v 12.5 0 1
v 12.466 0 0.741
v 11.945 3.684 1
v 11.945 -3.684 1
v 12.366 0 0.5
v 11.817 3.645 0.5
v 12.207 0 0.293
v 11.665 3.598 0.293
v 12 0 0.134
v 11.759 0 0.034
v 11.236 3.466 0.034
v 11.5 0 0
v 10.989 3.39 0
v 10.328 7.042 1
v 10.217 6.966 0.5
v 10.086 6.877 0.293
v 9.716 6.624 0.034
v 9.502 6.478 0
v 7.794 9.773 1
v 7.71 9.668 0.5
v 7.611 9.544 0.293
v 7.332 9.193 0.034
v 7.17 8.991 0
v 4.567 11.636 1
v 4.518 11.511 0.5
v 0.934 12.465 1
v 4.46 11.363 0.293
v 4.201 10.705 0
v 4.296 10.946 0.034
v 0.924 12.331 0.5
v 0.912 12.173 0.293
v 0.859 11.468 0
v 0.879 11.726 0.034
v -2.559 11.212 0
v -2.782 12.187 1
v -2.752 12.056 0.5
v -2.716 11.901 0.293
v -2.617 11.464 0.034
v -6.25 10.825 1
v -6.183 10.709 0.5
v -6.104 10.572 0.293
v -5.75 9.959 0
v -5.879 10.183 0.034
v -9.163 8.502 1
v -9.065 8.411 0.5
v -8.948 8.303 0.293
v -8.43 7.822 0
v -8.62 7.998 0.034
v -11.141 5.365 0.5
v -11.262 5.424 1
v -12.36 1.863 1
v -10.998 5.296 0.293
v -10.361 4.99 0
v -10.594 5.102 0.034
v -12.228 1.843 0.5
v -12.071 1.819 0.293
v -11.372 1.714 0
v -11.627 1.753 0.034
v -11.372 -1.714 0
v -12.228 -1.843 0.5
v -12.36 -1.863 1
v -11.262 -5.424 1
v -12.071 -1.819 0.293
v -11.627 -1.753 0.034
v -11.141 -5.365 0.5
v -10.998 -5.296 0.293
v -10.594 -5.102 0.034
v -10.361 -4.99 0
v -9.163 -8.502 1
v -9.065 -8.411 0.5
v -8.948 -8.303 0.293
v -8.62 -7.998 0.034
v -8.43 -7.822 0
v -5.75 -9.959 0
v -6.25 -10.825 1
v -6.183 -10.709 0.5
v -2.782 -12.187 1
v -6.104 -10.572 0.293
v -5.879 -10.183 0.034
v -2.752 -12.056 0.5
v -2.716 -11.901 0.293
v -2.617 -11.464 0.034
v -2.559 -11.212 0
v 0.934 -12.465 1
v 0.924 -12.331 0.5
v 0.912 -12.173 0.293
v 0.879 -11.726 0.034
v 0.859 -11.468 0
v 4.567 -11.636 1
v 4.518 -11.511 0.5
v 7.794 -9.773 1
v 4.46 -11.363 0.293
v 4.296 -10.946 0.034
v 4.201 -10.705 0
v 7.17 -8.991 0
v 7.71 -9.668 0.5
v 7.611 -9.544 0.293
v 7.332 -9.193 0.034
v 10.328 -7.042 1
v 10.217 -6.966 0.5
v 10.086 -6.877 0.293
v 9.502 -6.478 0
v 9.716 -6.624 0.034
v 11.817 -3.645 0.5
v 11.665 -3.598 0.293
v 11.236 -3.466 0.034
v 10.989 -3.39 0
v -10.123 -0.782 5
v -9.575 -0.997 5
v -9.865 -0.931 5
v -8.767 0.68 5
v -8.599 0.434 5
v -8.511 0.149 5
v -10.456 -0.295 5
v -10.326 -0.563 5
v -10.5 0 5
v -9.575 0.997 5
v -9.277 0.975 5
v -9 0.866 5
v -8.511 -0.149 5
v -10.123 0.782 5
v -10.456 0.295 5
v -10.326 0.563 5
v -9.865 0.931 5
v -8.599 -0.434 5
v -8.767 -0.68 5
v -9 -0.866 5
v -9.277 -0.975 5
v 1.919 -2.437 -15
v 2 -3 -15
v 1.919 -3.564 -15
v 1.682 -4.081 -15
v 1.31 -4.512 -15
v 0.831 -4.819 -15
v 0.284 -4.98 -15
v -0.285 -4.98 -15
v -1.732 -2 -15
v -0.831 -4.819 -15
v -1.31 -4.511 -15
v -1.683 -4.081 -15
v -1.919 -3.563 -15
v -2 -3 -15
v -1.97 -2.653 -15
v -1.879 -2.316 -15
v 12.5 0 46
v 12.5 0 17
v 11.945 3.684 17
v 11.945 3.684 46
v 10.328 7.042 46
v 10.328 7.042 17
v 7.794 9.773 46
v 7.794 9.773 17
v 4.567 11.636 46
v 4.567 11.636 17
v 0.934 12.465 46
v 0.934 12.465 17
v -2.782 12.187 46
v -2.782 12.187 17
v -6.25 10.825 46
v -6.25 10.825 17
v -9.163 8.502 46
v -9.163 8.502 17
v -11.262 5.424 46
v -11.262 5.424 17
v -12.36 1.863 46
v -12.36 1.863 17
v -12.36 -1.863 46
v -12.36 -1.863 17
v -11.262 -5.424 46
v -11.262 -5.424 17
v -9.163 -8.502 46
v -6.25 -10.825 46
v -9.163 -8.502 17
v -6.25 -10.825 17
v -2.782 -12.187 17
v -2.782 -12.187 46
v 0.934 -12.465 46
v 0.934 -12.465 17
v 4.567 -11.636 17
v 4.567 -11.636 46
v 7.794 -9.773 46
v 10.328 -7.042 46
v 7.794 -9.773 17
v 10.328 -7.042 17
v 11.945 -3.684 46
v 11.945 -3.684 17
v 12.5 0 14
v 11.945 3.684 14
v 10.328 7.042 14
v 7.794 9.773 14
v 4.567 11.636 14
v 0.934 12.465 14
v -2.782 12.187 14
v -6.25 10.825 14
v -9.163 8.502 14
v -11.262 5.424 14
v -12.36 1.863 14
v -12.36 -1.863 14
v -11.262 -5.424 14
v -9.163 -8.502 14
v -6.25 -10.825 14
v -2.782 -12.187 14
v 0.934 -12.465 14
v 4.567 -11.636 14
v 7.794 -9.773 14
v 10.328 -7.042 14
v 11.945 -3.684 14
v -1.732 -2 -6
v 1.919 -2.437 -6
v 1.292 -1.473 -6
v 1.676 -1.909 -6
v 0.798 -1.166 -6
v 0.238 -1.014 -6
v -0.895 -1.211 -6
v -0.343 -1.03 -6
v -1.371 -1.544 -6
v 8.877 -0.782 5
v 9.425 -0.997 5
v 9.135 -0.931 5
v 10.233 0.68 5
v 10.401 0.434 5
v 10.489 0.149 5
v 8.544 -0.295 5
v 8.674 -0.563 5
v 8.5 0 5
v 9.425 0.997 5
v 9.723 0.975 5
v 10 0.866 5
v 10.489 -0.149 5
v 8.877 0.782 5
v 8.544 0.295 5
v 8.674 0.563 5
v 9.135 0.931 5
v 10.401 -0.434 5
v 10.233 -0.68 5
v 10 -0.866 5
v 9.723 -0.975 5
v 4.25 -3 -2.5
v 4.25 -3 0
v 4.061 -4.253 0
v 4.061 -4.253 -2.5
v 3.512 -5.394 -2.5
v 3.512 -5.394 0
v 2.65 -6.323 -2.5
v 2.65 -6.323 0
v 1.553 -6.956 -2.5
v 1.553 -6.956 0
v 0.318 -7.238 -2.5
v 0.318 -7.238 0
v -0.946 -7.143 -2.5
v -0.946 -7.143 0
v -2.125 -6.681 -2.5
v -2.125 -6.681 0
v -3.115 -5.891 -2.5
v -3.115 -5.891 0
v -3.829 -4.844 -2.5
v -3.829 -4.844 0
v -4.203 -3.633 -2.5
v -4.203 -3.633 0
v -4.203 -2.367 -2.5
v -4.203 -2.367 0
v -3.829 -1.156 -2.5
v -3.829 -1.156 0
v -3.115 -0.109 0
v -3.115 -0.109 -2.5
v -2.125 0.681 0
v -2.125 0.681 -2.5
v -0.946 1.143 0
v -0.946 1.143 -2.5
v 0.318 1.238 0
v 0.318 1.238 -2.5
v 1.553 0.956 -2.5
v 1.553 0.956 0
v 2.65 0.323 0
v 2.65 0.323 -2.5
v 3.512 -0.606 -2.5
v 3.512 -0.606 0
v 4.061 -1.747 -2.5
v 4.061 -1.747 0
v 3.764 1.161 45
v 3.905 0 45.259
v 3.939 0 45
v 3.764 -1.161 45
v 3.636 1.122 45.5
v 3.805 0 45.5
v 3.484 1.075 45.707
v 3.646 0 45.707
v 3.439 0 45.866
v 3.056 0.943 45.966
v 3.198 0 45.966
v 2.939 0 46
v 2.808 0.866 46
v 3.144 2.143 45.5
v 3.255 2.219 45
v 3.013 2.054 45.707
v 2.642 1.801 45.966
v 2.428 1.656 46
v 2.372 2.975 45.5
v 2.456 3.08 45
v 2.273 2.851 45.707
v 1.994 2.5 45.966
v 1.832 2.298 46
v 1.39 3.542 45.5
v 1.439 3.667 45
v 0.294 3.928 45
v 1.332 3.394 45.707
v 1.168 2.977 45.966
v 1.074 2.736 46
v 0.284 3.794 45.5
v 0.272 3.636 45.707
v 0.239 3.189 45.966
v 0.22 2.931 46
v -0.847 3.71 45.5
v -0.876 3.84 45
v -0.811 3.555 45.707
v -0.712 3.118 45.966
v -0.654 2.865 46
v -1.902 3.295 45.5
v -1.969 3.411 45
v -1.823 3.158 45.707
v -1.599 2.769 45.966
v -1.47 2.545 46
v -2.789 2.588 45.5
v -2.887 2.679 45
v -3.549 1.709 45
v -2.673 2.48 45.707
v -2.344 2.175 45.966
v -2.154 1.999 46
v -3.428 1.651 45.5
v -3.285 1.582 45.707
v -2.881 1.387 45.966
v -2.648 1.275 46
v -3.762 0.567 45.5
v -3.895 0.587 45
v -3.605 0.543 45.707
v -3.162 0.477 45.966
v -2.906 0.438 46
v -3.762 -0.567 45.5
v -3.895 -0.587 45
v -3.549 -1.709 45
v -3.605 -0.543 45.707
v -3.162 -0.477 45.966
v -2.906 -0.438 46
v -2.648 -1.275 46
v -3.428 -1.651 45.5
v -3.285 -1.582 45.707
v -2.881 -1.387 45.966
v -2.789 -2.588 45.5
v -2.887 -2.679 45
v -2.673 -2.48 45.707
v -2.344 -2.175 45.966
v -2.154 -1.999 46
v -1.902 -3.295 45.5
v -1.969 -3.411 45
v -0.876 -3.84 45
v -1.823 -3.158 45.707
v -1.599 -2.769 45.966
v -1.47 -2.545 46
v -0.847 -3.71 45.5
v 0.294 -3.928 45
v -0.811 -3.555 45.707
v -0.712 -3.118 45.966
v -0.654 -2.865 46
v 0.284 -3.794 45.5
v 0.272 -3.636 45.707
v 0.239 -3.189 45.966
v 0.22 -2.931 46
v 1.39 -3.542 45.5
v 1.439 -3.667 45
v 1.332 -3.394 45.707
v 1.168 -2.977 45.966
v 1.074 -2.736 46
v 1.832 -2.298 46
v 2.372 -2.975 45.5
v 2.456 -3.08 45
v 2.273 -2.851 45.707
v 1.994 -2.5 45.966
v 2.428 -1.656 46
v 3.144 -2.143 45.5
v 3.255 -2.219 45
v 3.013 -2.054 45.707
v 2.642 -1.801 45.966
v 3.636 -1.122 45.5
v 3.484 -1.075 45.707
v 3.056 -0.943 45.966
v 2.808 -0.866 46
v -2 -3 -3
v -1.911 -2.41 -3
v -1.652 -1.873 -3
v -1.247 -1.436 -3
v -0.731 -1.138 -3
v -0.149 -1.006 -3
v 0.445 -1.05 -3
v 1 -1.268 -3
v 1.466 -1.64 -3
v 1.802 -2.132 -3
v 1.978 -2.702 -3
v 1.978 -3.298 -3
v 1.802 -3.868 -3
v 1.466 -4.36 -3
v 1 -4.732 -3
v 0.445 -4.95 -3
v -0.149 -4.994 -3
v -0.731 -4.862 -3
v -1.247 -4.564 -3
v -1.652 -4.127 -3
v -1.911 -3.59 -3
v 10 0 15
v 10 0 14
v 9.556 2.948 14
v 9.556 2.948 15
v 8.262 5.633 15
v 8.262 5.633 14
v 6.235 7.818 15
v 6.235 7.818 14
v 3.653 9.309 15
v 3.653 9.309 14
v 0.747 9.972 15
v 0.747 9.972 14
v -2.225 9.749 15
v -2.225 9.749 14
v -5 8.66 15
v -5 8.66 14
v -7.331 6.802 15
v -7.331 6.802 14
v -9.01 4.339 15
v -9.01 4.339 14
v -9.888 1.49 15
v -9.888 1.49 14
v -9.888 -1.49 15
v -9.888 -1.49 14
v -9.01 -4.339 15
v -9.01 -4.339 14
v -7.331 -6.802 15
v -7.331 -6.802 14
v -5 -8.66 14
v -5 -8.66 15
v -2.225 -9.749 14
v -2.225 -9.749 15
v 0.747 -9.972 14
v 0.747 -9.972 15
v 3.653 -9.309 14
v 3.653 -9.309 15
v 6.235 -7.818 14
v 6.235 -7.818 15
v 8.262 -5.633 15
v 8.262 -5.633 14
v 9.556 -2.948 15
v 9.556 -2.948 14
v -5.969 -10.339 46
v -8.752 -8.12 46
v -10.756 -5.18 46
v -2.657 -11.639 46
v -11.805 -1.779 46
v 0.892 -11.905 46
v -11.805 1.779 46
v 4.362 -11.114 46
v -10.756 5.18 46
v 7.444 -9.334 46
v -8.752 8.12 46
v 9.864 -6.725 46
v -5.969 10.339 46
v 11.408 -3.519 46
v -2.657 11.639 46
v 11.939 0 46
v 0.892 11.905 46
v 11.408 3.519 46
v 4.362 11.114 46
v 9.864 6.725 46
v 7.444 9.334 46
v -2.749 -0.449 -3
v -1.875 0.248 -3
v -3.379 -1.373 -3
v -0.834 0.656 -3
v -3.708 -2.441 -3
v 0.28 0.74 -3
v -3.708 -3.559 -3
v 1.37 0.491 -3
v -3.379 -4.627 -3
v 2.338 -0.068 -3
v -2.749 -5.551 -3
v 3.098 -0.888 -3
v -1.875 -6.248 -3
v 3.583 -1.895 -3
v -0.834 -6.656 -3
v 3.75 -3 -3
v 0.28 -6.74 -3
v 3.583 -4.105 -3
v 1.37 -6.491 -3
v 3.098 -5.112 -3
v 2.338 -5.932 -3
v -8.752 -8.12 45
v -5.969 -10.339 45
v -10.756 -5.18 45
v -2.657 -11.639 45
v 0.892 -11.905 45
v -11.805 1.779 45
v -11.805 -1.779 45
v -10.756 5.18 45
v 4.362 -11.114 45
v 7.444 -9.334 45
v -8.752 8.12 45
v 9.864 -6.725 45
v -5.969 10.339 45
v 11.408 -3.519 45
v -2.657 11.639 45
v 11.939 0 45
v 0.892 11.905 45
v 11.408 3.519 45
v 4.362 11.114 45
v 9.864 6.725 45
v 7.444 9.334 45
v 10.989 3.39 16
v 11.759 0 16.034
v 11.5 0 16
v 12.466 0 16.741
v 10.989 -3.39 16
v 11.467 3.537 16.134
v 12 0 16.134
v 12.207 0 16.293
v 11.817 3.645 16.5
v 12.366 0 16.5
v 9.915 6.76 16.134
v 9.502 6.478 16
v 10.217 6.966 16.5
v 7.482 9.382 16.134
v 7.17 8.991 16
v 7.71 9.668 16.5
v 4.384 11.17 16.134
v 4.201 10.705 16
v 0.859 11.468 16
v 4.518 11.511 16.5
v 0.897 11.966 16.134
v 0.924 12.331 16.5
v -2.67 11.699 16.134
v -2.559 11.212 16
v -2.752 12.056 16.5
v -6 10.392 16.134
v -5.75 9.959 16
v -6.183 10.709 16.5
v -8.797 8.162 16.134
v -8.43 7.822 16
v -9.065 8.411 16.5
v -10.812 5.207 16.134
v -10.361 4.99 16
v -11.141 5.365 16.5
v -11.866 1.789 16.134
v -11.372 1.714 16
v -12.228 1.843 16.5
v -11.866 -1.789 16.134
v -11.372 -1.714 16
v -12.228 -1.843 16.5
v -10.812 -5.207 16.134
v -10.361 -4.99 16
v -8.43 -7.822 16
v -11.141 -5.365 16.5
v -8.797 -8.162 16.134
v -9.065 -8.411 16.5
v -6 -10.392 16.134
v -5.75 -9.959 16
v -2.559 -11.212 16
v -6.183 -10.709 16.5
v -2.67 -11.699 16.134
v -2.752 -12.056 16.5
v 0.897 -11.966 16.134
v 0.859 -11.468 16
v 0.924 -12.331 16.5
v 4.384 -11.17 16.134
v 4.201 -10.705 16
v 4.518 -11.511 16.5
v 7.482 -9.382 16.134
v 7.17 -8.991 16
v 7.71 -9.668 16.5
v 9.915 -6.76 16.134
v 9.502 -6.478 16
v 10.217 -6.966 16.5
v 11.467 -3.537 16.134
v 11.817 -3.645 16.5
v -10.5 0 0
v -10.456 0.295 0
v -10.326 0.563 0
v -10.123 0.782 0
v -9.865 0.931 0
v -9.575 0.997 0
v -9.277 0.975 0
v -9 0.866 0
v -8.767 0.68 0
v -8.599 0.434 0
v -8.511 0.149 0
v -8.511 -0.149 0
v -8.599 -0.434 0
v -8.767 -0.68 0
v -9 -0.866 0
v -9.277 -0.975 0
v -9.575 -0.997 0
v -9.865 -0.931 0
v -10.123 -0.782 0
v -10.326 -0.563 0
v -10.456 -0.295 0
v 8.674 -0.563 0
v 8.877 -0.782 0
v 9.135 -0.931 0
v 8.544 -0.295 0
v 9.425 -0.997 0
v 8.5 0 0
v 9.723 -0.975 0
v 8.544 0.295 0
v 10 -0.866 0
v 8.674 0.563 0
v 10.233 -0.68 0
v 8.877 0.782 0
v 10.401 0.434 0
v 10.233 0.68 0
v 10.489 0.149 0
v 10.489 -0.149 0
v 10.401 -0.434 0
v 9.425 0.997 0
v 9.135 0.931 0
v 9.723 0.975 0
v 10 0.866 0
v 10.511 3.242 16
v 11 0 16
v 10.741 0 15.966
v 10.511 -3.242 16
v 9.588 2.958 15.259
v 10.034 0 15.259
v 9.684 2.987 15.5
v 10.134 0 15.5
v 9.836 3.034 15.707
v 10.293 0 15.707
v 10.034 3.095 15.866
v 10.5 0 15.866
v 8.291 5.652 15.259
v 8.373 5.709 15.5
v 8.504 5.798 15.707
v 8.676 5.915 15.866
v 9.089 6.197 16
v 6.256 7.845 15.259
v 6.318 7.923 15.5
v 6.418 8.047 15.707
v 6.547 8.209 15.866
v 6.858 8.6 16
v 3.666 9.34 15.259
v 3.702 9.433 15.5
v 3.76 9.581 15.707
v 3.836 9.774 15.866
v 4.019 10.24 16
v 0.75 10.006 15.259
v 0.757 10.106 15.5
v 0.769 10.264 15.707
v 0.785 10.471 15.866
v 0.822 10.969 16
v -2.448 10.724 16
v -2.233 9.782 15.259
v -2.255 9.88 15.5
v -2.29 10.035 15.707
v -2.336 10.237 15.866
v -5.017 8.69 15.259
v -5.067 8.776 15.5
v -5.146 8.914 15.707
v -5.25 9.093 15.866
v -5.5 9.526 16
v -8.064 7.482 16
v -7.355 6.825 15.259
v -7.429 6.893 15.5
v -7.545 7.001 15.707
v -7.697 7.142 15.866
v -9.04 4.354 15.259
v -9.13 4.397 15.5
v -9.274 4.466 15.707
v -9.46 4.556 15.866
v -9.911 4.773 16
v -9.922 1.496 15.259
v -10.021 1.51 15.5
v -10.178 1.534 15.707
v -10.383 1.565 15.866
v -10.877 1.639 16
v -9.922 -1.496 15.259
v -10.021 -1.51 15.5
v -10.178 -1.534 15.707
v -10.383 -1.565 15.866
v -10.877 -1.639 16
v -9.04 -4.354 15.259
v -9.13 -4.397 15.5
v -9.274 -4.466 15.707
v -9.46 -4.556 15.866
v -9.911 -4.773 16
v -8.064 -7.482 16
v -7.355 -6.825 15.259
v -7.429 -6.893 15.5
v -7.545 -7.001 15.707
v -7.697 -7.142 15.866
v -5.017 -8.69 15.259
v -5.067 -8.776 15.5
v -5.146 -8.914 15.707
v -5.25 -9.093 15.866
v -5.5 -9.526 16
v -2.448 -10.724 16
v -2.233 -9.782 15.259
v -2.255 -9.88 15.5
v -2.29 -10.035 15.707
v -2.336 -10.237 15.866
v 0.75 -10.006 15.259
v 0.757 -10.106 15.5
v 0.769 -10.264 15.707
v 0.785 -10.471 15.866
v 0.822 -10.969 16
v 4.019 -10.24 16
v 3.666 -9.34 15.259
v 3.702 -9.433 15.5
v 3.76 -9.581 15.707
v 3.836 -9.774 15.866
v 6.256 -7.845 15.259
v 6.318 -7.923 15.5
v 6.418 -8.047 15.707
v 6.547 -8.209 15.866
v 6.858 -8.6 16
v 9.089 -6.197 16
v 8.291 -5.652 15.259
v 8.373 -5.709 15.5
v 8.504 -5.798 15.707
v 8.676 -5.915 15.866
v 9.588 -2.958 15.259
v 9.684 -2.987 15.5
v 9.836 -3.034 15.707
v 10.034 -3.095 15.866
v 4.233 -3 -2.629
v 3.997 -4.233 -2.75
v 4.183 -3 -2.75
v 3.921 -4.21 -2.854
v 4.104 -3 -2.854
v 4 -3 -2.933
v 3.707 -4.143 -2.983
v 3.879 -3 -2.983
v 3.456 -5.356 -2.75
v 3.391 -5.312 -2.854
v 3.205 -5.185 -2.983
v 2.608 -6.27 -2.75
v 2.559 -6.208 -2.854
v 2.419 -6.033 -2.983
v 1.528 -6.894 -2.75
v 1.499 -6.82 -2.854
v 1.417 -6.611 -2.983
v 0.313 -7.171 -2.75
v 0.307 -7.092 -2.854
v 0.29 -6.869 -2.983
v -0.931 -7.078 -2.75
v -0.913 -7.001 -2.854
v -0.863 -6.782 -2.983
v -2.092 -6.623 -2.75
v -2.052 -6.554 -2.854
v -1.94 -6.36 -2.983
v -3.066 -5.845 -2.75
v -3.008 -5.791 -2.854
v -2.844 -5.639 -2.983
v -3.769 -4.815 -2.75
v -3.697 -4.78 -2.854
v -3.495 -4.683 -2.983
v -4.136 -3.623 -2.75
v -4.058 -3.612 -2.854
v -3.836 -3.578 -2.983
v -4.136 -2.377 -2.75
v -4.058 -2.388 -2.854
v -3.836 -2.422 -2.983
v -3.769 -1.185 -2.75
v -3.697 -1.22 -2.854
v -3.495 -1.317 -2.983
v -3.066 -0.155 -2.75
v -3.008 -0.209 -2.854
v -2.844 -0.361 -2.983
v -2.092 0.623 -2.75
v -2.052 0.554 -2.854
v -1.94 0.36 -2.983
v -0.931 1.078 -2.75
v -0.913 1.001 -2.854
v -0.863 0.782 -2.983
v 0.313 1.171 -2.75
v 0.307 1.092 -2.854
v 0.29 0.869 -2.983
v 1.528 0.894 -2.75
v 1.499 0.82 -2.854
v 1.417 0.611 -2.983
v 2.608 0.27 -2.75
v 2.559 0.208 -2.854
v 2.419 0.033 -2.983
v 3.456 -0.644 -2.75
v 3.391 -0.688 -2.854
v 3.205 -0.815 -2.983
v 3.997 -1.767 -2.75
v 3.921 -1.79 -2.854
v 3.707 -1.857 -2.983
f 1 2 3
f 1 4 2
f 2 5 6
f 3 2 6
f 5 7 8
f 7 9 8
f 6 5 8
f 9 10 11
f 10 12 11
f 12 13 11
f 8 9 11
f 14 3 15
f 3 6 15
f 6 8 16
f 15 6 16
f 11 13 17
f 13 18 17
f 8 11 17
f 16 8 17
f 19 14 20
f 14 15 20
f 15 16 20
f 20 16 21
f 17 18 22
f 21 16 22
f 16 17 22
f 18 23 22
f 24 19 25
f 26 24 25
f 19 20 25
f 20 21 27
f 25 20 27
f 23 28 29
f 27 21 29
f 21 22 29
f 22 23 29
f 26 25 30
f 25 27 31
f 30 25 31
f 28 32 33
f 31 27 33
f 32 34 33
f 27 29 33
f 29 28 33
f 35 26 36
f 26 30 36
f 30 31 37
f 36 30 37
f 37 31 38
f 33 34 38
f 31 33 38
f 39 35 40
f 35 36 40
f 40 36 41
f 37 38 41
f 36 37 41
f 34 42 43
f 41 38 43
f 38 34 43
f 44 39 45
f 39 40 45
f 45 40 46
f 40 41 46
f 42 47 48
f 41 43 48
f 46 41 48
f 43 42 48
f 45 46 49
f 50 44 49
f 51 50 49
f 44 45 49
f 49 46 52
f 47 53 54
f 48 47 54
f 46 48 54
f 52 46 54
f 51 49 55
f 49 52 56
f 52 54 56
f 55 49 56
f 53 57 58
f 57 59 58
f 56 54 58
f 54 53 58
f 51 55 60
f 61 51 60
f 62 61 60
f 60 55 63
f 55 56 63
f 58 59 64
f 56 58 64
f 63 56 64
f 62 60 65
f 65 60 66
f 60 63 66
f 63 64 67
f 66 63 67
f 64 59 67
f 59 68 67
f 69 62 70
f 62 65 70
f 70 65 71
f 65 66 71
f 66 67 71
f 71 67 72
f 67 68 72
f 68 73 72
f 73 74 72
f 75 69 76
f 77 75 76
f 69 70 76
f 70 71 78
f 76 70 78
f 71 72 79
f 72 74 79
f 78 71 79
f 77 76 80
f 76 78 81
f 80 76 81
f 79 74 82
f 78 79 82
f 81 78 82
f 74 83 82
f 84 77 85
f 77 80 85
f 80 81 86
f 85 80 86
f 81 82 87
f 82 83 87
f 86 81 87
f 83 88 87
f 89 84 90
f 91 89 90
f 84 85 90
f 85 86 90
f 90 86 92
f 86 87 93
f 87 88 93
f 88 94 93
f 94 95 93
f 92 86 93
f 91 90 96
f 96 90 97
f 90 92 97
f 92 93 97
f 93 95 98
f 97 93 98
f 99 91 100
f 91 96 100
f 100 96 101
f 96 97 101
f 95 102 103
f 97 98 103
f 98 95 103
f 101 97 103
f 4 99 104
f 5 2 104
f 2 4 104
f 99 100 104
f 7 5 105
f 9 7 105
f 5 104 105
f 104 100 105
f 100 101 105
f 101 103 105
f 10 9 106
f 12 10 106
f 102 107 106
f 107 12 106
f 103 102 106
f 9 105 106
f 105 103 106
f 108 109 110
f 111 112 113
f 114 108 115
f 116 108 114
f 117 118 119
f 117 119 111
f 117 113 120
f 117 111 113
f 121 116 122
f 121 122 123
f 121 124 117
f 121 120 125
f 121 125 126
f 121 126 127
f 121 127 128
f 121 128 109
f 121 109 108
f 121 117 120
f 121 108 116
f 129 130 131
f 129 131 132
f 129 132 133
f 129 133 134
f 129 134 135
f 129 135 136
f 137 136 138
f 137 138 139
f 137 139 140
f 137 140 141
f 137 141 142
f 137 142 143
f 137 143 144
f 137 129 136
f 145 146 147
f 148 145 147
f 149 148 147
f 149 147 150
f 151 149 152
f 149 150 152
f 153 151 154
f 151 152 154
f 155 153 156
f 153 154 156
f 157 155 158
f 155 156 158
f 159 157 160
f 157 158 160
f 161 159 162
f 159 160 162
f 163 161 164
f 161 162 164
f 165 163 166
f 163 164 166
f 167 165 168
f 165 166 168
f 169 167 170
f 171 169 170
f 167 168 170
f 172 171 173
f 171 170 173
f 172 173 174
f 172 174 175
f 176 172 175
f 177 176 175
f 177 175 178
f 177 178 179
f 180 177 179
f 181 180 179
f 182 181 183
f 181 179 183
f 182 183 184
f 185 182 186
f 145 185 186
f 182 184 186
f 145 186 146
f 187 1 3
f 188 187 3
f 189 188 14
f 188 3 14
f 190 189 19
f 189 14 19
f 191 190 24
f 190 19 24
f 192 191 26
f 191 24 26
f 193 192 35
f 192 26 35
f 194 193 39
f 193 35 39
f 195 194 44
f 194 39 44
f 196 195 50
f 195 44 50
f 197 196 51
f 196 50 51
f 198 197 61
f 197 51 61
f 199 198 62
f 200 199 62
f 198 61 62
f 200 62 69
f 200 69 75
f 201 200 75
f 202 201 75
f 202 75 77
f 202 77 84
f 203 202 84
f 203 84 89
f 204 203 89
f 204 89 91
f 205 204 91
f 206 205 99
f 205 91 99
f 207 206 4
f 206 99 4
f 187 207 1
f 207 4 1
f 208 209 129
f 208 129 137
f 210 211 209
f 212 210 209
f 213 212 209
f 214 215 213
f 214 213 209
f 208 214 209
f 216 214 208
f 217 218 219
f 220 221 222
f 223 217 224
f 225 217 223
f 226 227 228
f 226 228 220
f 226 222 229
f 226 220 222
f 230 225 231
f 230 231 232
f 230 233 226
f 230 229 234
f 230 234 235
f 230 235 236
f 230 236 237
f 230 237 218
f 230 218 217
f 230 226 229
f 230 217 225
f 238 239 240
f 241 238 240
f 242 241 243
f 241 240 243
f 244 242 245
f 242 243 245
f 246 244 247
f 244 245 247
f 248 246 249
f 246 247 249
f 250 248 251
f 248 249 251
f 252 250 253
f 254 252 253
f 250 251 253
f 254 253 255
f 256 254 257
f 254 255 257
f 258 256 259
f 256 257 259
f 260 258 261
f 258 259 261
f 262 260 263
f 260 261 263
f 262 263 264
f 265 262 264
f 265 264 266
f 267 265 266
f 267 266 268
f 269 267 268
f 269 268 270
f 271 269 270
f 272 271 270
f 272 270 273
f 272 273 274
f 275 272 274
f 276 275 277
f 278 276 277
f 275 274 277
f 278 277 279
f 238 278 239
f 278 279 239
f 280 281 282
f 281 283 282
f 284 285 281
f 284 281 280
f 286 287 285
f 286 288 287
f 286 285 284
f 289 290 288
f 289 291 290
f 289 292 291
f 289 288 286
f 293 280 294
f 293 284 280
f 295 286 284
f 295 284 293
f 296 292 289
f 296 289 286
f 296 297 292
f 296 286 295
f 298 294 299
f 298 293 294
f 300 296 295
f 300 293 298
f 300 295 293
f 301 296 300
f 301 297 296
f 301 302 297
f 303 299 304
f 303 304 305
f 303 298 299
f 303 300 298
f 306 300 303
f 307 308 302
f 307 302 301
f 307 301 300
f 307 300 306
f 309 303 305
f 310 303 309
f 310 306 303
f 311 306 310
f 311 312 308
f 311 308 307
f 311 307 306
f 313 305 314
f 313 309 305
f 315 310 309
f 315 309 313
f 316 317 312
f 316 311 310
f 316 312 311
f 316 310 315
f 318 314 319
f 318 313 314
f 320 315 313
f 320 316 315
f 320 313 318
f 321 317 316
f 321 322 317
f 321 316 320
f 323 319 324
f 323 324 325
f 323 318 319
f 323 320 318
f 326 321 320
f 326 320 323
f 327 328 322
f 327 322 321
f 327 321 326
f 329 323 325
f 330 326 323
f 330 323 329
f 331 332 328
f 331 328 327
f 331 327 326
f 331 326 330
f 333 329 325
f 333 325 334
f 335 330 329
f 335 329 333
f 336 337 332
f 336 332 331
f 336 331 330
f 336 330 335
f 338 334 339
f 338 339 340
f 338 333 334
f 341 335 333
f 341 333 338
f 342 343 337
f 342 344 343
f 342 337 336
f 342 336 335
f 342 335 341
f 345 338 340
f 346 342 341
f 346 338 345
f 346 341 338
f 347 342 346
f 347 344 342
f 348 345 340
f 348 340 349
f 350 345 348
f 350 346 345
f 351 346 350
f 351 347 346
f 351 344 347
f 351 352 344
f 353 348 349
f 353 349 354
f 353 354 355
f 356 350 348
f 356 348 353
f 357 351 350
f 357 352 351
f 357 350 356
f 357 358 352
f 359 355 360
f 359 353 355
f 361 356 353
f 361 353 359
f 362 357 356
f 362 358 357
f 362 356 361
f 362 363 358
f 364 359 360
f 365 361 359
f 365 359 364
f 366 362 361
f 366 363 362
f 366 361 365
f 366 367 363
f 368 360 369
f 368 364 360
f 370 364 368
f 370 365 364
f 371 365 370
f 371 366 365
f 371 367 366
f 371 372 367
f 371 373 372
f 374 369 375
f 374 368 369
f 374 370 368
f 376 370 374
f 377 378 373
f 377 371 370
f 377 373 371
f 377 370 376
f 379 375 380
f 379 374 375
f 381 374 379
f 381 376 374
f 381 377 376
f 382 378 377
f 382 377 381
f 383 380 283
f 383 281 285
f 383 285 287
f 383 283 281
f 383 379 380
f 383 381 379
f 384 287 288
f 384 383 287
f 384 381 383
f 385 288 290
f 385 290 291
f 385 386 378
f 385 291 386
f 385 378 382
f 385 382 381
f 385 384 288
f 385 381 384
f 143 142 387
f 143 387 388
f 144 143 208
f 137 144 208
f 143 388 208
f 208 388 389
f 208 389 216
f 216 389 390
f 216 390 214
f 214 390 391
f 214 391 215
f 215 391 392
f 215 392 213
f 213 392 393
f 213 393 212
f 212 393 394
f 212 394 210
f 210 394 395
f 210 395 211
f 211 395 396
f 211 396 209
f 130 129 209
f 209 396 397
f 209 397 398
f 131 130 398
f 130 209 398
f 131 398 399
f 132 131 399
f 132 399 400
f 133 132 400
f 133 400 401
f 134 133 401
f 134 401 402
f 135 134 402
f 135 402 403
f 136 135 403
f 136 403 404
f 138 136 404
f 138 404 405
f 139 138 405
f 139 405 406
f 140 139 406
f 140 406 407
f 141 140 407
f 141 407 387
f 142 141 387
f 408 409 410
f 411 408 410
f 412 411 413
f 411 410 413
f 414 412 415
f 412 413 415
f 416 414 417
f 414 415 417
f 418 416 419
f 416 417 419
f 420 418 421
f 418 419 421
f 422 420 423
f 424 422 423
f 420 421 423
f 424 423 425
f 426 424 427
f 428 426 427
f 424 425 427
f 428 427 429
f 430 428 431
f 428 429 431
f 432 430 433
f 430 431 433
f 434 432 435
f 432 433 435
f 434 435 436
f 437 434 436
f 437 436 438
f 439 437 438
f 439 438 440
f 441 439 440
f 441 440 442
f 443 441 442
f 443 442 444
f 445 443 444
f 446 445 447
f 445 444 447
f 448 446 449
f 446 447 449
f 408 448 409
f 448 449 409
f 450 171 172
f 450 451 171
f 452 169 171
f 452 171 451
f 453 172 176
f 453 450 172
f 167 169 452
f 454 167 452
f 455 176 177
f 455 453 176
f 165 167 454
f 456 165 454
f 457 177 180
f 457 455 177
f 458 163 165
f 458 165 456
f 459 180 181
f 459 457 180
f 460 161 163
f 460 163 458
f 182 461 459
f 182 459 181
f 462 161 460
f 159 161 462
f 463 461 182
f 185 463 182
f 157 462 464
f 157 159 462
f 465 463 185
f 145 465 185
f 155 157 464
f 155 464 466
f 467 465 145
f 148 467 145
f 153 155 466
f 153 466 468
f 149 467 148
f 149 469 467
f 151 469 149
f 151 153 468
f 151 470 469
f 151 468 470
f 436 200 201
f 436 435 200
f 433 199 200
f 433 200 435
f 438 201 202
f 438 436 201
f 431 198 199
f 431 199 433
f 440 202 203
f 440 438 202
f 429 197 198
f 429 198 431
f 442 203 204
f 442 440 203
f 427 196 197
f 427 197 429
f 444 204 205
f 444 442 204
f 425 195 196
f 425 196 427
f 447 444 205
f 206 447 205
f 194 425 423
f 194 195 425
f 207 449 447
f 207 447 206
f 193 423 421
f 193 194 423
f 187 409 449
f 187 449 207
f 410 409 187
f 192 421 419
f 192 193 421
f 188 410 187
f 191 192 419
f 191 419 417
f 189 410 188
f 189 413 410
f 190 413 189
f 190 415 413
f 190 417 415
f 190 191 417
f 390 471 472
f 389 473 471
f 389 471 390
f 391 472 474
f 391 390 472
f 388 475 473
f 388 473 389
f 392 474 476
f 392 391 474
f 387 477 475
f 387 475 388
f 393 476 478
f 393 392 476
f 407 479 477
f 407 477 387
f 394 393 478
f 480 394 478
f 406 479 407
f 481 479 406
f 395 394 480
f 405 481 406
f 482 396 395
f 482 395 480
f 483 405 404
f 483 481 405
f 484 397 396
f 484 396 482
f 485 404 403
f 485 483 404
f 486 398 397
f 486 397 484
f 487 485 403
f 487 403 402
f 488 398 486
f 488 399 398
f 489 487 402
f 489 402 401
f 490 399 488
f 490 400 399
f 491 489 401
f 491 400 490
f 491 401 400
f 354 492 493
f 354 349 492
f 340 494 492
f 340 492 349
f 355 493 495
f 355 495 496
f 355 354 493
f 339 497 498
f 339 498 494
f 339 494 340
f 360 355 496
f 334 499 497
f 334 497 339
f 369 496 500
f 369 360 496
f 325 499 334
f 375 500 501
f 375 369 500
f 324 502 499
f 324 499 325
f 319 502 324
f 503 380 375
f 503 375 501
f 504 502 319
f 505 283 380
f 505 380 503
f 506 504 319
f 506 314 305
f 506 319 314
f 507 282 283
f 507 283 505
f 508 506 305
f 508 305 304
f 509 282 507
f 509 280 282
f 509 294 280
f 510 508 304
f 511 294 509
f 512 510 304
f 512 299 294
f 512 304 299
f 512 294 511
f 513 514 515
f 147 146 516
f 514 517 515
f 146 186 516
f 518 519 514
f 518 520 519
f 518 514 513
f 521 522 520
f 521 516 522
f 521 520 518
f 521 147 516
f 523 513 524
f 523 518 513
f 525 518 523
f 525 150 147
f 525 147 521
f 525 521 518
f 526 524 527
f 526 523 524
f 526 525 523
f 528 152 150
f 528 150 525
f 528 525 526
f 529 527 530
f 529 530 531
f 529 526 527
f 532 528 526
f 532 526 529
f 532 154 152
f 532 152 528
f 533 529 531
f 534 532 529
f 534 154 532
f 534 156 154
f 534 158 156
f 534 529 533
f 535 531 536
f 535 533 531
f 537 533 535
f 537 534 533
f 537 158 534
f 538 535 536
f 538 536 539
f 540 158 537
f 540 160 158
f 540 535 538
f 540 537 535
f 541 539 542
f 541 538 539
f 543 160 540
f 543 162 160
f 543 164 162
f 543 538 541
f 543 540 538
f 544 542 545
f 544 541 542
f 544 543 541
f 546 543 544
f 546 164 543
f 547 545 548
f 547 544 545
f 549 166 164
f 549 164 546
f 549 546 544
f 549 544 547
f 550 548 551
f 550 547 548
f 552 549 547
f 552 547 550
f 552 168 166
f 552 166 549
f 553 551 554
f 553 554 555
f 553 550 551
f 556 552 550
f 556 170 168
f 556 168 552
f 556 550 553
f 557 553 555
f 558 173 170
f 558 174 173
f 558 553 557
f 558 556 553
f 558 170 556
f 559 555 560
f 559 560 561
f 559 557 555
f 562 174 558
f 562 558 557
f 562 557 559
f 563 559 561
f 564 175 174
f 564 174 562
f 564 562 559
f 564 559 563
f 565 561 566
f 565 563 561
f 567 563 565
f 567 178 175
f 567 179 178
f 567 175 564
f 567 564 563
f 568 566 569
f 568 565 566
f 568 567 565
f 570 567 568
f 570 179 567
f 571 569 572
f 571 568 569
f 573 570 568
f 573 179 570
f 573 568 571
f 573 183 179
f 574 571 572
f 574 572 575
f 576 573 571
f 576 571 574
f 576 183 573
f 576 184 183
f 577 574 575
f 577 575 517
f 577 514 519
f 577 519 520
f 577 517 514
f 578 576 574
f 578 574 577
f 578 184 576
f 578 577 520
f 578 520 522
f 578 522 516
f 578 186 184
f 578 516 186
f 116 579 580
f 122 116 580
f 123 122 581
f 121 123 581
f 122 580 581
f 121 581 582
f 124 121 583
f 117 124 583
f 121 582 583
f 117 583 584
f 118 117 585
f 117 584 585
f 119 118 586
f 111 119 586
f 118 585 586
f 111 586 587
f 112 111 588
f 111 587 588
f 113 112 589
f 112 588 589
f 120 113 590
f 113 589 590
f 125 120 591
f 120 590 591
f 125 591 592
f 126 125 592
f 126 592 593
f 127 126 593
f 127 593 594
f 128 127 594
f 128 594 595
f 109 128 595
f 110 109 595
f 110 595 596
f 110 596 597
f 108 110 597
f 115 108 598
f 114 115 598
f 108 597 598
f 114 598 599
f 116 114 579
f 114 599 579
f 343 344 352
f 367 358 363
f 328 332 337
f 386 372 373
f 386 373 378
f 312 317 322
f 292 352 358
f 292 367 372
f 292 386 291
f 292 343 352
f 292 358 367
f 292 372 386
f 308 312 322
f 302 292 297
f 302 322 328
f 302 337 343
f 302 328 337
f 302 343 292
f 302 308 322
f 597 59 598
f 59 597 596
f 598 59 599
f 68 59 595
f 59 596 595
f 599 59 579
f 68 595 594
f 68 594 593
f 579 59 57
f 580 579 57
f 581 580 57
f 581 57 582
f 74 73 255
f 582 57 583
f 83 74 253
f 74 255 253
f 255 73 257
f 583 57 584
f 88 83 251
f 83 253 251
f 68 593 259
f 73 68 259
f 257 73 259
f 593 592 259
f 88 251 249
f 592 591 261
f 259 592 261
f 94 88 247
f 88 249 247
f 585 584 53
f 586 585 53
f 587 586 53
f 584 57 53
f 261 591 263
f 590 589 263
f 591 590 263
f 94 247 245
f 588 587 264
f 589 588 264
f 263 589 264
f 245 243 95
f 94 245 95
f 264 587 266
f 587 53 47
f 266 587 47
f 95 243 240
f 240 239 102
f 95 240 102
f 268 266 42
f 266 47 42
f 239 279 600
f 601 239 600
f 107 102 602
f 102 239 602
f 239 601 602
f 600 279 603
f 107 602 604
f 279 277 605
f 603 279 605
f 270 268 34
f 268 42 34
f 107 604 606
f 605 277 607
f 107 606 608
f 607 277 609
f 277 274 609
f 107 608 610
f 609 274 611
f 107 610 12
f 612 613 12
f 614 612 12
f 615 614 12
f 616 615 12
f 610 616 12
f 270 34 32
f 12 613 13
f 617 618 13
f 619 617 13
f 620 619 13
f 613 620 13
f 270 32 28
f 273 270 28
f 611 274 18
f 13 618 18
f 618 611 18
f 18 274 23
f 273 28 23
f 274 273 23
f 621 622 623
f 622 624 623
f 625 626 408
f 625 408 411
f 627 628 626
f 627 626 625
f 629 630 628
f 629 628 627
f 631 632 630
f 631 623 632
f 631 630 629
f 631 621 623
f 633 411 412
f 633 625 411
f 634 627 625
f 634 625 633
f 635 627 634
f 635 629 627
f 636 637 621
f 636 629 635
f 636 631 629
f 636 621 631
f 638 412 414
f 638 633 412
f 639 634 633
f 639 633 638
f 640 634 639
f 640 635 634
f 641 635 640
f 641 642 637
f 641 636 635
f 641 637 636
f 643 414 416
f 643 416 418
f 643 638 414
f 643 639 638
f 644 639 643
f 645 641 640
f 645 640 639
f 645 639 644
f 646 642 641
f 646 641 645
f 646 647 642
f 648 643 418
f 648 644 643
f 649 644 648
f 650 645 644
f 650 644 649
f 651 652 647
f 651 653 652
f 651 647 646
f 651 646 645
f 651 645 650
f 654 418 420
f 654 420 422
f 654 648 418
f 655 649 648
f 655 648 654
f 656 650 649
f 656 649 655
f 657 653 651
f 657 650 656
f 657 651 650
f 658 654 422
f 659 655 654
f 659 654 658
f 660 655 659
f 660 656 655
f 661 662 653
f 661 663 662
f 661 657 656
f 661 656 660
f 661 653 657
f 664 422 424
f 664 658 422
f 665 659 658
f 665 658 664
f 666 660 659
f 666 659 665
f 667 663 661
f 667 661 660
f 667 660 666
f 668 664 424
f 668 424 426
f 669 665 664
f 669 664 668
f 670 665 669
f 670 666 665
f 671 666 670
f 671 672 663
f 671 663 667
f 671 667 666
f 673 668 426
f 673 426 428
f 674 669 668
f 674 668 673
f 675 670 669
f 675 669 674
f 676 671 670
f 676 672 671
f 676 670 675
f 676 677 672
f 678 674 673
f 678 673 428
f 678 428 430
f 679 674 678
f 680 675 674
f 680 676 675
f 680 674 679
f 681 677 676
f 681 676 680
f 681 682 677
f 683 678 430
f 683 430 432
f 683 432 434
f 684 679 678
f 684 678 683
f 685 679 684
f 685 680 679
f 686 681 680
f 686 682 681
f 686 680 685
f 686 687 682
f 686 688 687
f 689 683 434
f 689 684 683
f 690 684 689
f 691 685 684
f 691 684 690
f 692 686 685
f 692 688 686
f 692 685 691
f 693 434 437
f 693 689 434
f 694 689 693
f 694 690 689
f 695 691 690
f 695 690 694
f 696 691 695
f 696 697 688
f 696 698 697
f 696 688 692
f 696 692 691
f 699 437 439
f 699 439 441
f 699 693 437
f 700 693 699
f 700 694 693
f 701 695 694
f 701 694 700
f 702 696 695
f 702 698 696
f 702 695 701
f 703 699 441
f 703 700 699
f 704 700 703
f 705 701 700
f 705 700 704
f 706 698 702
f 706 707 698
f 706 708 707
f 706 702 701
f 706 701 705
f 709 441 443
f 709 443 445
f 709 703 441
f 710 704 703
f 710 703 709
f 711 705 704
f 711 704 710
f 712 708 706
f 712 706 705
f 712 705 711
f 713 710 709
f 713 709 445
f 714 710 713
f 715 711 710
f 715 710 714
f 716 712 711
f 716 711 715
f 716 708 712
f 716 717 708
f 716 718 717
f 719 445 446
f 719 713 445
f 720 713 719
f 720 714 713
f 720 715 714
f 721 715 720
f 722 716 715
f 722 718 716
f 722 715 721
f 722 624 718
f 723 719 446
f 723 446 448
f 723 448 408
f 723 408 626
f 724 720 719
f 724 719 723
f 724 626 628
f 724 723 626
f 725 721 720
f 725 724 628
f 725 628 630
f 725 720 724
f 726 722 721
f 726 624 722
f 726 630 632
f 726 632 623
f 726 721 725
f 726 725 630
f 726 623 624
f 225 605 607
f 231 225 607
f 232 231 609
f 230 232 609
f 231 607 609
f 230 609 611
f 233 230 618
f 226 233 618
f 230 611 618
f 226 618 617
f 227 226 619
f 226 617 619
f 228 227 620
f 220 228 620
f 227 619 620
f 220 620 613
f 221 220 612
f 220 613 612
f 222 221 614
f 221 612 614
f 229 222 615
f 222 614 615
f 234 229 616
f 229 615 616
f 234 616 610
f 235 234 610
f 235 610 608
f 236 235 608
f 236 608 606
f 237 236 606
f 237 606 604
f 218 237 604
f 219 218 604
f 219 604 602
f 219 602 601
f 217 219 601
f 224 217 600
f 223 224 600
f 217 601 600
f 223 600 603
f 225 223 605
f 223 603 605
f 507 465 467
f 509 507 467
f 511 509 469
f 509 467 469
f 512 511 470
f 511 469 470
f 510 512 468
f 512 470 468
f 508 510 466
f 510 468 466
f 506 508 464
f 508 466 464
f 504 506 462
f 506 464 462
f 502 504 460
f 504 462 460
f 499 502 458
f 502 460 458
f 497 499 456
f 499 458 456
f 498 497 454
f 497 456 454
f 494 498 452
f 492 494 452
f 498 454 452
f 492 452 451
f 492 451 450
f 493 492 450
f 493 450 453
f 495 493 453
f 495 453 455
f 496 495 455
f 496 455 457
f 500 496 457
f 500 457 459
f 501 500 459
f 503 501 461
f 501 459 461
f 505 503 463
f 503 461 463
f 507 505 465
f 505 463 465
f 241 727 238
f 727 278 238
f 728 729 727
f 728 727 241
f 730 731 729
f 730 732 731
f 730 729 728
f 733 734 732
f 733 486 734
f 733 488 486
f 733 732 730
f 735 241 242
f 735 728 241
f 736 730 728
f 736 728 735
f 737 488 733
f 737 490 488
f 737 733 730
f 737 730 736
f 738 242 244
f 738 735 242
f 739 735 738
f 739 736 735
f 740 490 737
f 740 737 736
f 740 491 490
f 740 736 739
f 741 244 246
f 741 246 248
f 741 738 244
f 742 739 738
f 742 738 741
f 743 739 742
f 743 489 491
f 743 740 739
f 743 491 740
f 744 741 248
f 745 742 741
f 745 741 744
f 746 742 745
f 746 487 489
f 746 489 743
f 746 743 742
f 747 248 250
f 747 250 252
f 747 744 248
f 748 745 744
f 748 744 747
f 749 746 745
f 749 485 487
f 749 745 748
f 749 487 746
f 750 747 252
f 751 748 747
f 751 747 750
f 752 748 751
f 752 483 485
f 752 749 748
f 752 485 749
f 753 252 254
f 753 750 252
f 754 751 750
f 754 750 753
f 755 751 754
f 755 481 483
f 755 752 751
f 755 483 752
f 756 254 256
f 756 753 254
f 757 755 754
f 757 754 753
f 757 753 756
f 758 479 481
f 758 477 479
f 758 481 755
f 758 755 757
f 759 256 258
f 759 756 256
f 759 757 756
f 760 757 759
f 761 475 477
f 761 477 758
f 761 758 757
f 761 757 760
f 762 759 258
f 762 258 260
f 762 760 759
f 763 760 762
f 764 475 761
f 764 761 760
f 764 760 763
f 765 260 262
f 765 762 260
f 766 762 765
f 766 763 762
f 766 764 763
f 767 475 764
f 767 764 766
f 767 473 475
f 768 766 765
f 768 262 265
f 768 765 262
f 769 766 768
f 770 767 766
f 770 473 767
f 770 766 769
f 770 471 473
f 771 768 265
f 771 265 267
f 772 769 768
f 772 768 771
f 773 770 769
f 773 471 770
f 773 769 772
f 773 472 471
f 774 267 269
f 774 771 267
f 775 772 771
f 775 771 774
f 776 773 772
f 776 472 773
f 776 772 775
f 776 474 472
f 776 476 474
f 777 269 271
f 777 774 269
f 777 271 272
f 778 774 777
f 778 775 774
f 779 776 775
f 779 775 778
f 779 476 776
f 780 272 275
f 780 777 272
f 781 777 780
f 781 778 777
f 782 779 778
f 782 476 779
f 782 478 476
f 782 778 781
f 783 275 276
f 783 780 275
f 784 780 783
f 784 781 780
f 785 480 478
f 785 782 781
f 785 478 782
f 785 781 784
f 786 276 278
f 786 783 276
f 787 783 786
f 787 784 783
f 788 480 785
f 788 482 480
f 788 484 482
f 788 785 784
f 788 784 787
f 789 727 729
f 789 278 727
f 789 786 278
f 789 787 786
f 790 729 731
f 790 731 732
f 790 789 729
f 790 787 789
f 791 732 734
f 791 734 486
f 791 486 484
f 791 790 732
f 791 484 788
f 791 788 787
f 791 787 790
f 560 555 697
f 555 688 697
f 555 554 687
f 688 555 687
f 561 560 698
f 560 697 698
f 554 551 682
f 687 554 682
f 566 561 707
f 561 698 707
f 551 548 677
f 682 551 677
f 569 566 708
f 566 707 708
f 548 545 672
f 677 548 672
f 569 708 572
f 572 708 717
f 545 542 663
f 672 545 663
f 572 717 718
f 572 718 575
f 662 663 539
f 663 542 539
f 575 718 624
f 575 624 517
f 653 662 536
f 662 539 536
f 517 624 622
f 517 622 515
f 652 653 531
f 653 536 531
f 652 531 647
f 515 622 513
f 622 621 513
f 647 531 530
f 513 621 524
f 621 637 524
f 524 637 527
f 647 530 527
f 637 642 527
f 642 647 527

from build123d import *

# Parameters (mm, degrees)
SKETCH1_R               = 12.5
BOSS_EXTRUDE1_DEPTH     = 14
SKETCH2_R               = 10
BOSS_EXTRUDE2_DEPTH     = 2
SKETCH3_R               = 12.5
BOSS_EXTRUDE3_DEPTH     = 30
SKETCH4_R               = 11.938790889
CUT_EXTRUDE1_DEPTH      = 1
SKETCH5_R               = 3.938949389
BOSS_EXTRUDE4_DEPTH     = 1
FILLET1_R               = 1
FILLET2_R               = 1
FILLET3_R               = 1
SKETCH6_R               = 1
CUT_EXTRUDE2_DEPTH      = 5
SKETCH7_R               = 4.25
BOSS_EXTRUDE5_DEPTH     = 3
FILLET4_R               = 0.5
SKETCH8_R               = 2
BOSS_EXTRUDE6_DEPTH     = 12
CUT_EXTRUDE3_DEPTH      = 64.509841777
CUT_EXTRUDE3_DEPTH_BACK = 9


with BuildPart() as part:
    # Sketch1 → Boss-Extrude1 (new body)
    with BuildSketch(Plane.XY):
        Circle(SKETCH1_R)
    extrude(amount=BOSS_EXTRUDE1_DEPTH)

    # Sketch2 → Boss-Extrude2 (add)
    with BuildSketch(Plane.XY.offset(14)):
        Circle(SKETCH2_R)
    extrude(amount=BOSS_EXTRUDE2_DEPTH)

    # Sketch3 → Boss-Extrude3 (add)
    with BuildSketch(Plane.XY.offset(16)):
        Circle(SKETCH3_R)
    extrude(amount=BOSS_EXTRUDE3_DEPTH)

    # Sketch4 → Cut-Extrude1 (cut)
    with BuildSketch(Plane.XY.offset(46)):
        Circle(SKETCH4_R)
    extrude(amount=-CUT_EXTRUDE1_DEPTH, mode=Mode.SUBTRACT)

    # Sketch5 → Boss-Extrude4 (add)
    with BuildSketch(Plane.XY.offset(45)):
        Circle(SKETCH5_R)
    extrude(amount=BOSS_EXTRUDE4_DEPTH)

    # Fillet1
    fillet1_edges = [part.edges().sort_by_distance(p)[0] for p in [
        (-3.938949389, 0, 46),
    ]]
    fillet(fillet1_edges, radius=FILLET1_R - 0.0001)  # a hair under: the kernel refuses the full size

    # Fillet2
    fillet2_edges = [part.edges().sort_by_distance(p)[0] for p in [
        (-12.5, 0, 0),
    ]]
    fillet(fillet2_edges, radius=FILLET2_R)

    # Fillet3
    fillet3_edges = [part.edges().sort_by_distance(p)[0] for p in [
        (-12.5, 0, 16),
        (-10, 0, 16),
    ]]
    fillet(fillet3_edges, radius=FILLET3_R)

    # Sketch6 → Cut-Extrude2 (cut)
    with BuildSketch(Plane(origin=(0, 0, 0), x_dir=(-1, 0, 0), z_dir=(0, 0, -1))):
        with Locations((-9.5, 0)):
            Circle(SKETCH6_R)
        with Locations((9.5, 0)):
            Circle(SKETCH6_R)
    extrude(amount=-CUT_EXTRUDE2_DEPTH, mode=Mode.SUBTRACT)

    # Sketch7 → Boss-Extrude5 (add)
    with BuildSketch(Plane(origin=(0, 0, 0), x_dir=(-1, 0, 0), z_dir=(0, 0, -1))):
        with Locations(Location((0, -3, 0), (0, 0, 180))):
            Circle(SKETCH7_R)
    extrude(amount=BOSS_EXTRUDE5_DEPTH)

    # Fillet4
    fillet4_edges = [part.edges().sort_by_distance(p)[0] for p in [
        (-4.25, -3, -3),
    ]]
    fillet(fillet4_edges, radius=FILLET4_R)

    # Sketch8 → Boss-Extrude6 (add)
    with BuildSketch(Plane(origin=(0, 0, -3), x_dir=(-1, 0, 0), z_dir=(0, 0, -1))):
        with Locations((0, -3)):
            Circle(SKETCH8_R)
    extrude(amount=BOSS_EXTRUDE6_DEPTH)

    # Sketch9 → Cut-Extrude3 (cut, two sides: drawn at the far end of the back side and taken through both)
    with BuildSketch(Plane(origin=(0, 0, -15), x_dir=(-1, 0, 0), z_dir=(0, 0, -1)).offset(-CUT_EXTRUDE3_DEPTH_BACK)):
        Polygon((-53.075925999, -8.559326208), (-1.919066235, -2.436808394), (1.731963356, -1.999848545), (52.88882312, 4.122669269), (40.643787491, 106.436388797), (-65.320961628, 93.754393319), align=None)
    extrude(amount=CUT_EXTRUDE3_DEPTH + CUT_EXTRUDE3_DEPTH_BACK, mode=Mode.SUBTRACT)


solid = part.part
